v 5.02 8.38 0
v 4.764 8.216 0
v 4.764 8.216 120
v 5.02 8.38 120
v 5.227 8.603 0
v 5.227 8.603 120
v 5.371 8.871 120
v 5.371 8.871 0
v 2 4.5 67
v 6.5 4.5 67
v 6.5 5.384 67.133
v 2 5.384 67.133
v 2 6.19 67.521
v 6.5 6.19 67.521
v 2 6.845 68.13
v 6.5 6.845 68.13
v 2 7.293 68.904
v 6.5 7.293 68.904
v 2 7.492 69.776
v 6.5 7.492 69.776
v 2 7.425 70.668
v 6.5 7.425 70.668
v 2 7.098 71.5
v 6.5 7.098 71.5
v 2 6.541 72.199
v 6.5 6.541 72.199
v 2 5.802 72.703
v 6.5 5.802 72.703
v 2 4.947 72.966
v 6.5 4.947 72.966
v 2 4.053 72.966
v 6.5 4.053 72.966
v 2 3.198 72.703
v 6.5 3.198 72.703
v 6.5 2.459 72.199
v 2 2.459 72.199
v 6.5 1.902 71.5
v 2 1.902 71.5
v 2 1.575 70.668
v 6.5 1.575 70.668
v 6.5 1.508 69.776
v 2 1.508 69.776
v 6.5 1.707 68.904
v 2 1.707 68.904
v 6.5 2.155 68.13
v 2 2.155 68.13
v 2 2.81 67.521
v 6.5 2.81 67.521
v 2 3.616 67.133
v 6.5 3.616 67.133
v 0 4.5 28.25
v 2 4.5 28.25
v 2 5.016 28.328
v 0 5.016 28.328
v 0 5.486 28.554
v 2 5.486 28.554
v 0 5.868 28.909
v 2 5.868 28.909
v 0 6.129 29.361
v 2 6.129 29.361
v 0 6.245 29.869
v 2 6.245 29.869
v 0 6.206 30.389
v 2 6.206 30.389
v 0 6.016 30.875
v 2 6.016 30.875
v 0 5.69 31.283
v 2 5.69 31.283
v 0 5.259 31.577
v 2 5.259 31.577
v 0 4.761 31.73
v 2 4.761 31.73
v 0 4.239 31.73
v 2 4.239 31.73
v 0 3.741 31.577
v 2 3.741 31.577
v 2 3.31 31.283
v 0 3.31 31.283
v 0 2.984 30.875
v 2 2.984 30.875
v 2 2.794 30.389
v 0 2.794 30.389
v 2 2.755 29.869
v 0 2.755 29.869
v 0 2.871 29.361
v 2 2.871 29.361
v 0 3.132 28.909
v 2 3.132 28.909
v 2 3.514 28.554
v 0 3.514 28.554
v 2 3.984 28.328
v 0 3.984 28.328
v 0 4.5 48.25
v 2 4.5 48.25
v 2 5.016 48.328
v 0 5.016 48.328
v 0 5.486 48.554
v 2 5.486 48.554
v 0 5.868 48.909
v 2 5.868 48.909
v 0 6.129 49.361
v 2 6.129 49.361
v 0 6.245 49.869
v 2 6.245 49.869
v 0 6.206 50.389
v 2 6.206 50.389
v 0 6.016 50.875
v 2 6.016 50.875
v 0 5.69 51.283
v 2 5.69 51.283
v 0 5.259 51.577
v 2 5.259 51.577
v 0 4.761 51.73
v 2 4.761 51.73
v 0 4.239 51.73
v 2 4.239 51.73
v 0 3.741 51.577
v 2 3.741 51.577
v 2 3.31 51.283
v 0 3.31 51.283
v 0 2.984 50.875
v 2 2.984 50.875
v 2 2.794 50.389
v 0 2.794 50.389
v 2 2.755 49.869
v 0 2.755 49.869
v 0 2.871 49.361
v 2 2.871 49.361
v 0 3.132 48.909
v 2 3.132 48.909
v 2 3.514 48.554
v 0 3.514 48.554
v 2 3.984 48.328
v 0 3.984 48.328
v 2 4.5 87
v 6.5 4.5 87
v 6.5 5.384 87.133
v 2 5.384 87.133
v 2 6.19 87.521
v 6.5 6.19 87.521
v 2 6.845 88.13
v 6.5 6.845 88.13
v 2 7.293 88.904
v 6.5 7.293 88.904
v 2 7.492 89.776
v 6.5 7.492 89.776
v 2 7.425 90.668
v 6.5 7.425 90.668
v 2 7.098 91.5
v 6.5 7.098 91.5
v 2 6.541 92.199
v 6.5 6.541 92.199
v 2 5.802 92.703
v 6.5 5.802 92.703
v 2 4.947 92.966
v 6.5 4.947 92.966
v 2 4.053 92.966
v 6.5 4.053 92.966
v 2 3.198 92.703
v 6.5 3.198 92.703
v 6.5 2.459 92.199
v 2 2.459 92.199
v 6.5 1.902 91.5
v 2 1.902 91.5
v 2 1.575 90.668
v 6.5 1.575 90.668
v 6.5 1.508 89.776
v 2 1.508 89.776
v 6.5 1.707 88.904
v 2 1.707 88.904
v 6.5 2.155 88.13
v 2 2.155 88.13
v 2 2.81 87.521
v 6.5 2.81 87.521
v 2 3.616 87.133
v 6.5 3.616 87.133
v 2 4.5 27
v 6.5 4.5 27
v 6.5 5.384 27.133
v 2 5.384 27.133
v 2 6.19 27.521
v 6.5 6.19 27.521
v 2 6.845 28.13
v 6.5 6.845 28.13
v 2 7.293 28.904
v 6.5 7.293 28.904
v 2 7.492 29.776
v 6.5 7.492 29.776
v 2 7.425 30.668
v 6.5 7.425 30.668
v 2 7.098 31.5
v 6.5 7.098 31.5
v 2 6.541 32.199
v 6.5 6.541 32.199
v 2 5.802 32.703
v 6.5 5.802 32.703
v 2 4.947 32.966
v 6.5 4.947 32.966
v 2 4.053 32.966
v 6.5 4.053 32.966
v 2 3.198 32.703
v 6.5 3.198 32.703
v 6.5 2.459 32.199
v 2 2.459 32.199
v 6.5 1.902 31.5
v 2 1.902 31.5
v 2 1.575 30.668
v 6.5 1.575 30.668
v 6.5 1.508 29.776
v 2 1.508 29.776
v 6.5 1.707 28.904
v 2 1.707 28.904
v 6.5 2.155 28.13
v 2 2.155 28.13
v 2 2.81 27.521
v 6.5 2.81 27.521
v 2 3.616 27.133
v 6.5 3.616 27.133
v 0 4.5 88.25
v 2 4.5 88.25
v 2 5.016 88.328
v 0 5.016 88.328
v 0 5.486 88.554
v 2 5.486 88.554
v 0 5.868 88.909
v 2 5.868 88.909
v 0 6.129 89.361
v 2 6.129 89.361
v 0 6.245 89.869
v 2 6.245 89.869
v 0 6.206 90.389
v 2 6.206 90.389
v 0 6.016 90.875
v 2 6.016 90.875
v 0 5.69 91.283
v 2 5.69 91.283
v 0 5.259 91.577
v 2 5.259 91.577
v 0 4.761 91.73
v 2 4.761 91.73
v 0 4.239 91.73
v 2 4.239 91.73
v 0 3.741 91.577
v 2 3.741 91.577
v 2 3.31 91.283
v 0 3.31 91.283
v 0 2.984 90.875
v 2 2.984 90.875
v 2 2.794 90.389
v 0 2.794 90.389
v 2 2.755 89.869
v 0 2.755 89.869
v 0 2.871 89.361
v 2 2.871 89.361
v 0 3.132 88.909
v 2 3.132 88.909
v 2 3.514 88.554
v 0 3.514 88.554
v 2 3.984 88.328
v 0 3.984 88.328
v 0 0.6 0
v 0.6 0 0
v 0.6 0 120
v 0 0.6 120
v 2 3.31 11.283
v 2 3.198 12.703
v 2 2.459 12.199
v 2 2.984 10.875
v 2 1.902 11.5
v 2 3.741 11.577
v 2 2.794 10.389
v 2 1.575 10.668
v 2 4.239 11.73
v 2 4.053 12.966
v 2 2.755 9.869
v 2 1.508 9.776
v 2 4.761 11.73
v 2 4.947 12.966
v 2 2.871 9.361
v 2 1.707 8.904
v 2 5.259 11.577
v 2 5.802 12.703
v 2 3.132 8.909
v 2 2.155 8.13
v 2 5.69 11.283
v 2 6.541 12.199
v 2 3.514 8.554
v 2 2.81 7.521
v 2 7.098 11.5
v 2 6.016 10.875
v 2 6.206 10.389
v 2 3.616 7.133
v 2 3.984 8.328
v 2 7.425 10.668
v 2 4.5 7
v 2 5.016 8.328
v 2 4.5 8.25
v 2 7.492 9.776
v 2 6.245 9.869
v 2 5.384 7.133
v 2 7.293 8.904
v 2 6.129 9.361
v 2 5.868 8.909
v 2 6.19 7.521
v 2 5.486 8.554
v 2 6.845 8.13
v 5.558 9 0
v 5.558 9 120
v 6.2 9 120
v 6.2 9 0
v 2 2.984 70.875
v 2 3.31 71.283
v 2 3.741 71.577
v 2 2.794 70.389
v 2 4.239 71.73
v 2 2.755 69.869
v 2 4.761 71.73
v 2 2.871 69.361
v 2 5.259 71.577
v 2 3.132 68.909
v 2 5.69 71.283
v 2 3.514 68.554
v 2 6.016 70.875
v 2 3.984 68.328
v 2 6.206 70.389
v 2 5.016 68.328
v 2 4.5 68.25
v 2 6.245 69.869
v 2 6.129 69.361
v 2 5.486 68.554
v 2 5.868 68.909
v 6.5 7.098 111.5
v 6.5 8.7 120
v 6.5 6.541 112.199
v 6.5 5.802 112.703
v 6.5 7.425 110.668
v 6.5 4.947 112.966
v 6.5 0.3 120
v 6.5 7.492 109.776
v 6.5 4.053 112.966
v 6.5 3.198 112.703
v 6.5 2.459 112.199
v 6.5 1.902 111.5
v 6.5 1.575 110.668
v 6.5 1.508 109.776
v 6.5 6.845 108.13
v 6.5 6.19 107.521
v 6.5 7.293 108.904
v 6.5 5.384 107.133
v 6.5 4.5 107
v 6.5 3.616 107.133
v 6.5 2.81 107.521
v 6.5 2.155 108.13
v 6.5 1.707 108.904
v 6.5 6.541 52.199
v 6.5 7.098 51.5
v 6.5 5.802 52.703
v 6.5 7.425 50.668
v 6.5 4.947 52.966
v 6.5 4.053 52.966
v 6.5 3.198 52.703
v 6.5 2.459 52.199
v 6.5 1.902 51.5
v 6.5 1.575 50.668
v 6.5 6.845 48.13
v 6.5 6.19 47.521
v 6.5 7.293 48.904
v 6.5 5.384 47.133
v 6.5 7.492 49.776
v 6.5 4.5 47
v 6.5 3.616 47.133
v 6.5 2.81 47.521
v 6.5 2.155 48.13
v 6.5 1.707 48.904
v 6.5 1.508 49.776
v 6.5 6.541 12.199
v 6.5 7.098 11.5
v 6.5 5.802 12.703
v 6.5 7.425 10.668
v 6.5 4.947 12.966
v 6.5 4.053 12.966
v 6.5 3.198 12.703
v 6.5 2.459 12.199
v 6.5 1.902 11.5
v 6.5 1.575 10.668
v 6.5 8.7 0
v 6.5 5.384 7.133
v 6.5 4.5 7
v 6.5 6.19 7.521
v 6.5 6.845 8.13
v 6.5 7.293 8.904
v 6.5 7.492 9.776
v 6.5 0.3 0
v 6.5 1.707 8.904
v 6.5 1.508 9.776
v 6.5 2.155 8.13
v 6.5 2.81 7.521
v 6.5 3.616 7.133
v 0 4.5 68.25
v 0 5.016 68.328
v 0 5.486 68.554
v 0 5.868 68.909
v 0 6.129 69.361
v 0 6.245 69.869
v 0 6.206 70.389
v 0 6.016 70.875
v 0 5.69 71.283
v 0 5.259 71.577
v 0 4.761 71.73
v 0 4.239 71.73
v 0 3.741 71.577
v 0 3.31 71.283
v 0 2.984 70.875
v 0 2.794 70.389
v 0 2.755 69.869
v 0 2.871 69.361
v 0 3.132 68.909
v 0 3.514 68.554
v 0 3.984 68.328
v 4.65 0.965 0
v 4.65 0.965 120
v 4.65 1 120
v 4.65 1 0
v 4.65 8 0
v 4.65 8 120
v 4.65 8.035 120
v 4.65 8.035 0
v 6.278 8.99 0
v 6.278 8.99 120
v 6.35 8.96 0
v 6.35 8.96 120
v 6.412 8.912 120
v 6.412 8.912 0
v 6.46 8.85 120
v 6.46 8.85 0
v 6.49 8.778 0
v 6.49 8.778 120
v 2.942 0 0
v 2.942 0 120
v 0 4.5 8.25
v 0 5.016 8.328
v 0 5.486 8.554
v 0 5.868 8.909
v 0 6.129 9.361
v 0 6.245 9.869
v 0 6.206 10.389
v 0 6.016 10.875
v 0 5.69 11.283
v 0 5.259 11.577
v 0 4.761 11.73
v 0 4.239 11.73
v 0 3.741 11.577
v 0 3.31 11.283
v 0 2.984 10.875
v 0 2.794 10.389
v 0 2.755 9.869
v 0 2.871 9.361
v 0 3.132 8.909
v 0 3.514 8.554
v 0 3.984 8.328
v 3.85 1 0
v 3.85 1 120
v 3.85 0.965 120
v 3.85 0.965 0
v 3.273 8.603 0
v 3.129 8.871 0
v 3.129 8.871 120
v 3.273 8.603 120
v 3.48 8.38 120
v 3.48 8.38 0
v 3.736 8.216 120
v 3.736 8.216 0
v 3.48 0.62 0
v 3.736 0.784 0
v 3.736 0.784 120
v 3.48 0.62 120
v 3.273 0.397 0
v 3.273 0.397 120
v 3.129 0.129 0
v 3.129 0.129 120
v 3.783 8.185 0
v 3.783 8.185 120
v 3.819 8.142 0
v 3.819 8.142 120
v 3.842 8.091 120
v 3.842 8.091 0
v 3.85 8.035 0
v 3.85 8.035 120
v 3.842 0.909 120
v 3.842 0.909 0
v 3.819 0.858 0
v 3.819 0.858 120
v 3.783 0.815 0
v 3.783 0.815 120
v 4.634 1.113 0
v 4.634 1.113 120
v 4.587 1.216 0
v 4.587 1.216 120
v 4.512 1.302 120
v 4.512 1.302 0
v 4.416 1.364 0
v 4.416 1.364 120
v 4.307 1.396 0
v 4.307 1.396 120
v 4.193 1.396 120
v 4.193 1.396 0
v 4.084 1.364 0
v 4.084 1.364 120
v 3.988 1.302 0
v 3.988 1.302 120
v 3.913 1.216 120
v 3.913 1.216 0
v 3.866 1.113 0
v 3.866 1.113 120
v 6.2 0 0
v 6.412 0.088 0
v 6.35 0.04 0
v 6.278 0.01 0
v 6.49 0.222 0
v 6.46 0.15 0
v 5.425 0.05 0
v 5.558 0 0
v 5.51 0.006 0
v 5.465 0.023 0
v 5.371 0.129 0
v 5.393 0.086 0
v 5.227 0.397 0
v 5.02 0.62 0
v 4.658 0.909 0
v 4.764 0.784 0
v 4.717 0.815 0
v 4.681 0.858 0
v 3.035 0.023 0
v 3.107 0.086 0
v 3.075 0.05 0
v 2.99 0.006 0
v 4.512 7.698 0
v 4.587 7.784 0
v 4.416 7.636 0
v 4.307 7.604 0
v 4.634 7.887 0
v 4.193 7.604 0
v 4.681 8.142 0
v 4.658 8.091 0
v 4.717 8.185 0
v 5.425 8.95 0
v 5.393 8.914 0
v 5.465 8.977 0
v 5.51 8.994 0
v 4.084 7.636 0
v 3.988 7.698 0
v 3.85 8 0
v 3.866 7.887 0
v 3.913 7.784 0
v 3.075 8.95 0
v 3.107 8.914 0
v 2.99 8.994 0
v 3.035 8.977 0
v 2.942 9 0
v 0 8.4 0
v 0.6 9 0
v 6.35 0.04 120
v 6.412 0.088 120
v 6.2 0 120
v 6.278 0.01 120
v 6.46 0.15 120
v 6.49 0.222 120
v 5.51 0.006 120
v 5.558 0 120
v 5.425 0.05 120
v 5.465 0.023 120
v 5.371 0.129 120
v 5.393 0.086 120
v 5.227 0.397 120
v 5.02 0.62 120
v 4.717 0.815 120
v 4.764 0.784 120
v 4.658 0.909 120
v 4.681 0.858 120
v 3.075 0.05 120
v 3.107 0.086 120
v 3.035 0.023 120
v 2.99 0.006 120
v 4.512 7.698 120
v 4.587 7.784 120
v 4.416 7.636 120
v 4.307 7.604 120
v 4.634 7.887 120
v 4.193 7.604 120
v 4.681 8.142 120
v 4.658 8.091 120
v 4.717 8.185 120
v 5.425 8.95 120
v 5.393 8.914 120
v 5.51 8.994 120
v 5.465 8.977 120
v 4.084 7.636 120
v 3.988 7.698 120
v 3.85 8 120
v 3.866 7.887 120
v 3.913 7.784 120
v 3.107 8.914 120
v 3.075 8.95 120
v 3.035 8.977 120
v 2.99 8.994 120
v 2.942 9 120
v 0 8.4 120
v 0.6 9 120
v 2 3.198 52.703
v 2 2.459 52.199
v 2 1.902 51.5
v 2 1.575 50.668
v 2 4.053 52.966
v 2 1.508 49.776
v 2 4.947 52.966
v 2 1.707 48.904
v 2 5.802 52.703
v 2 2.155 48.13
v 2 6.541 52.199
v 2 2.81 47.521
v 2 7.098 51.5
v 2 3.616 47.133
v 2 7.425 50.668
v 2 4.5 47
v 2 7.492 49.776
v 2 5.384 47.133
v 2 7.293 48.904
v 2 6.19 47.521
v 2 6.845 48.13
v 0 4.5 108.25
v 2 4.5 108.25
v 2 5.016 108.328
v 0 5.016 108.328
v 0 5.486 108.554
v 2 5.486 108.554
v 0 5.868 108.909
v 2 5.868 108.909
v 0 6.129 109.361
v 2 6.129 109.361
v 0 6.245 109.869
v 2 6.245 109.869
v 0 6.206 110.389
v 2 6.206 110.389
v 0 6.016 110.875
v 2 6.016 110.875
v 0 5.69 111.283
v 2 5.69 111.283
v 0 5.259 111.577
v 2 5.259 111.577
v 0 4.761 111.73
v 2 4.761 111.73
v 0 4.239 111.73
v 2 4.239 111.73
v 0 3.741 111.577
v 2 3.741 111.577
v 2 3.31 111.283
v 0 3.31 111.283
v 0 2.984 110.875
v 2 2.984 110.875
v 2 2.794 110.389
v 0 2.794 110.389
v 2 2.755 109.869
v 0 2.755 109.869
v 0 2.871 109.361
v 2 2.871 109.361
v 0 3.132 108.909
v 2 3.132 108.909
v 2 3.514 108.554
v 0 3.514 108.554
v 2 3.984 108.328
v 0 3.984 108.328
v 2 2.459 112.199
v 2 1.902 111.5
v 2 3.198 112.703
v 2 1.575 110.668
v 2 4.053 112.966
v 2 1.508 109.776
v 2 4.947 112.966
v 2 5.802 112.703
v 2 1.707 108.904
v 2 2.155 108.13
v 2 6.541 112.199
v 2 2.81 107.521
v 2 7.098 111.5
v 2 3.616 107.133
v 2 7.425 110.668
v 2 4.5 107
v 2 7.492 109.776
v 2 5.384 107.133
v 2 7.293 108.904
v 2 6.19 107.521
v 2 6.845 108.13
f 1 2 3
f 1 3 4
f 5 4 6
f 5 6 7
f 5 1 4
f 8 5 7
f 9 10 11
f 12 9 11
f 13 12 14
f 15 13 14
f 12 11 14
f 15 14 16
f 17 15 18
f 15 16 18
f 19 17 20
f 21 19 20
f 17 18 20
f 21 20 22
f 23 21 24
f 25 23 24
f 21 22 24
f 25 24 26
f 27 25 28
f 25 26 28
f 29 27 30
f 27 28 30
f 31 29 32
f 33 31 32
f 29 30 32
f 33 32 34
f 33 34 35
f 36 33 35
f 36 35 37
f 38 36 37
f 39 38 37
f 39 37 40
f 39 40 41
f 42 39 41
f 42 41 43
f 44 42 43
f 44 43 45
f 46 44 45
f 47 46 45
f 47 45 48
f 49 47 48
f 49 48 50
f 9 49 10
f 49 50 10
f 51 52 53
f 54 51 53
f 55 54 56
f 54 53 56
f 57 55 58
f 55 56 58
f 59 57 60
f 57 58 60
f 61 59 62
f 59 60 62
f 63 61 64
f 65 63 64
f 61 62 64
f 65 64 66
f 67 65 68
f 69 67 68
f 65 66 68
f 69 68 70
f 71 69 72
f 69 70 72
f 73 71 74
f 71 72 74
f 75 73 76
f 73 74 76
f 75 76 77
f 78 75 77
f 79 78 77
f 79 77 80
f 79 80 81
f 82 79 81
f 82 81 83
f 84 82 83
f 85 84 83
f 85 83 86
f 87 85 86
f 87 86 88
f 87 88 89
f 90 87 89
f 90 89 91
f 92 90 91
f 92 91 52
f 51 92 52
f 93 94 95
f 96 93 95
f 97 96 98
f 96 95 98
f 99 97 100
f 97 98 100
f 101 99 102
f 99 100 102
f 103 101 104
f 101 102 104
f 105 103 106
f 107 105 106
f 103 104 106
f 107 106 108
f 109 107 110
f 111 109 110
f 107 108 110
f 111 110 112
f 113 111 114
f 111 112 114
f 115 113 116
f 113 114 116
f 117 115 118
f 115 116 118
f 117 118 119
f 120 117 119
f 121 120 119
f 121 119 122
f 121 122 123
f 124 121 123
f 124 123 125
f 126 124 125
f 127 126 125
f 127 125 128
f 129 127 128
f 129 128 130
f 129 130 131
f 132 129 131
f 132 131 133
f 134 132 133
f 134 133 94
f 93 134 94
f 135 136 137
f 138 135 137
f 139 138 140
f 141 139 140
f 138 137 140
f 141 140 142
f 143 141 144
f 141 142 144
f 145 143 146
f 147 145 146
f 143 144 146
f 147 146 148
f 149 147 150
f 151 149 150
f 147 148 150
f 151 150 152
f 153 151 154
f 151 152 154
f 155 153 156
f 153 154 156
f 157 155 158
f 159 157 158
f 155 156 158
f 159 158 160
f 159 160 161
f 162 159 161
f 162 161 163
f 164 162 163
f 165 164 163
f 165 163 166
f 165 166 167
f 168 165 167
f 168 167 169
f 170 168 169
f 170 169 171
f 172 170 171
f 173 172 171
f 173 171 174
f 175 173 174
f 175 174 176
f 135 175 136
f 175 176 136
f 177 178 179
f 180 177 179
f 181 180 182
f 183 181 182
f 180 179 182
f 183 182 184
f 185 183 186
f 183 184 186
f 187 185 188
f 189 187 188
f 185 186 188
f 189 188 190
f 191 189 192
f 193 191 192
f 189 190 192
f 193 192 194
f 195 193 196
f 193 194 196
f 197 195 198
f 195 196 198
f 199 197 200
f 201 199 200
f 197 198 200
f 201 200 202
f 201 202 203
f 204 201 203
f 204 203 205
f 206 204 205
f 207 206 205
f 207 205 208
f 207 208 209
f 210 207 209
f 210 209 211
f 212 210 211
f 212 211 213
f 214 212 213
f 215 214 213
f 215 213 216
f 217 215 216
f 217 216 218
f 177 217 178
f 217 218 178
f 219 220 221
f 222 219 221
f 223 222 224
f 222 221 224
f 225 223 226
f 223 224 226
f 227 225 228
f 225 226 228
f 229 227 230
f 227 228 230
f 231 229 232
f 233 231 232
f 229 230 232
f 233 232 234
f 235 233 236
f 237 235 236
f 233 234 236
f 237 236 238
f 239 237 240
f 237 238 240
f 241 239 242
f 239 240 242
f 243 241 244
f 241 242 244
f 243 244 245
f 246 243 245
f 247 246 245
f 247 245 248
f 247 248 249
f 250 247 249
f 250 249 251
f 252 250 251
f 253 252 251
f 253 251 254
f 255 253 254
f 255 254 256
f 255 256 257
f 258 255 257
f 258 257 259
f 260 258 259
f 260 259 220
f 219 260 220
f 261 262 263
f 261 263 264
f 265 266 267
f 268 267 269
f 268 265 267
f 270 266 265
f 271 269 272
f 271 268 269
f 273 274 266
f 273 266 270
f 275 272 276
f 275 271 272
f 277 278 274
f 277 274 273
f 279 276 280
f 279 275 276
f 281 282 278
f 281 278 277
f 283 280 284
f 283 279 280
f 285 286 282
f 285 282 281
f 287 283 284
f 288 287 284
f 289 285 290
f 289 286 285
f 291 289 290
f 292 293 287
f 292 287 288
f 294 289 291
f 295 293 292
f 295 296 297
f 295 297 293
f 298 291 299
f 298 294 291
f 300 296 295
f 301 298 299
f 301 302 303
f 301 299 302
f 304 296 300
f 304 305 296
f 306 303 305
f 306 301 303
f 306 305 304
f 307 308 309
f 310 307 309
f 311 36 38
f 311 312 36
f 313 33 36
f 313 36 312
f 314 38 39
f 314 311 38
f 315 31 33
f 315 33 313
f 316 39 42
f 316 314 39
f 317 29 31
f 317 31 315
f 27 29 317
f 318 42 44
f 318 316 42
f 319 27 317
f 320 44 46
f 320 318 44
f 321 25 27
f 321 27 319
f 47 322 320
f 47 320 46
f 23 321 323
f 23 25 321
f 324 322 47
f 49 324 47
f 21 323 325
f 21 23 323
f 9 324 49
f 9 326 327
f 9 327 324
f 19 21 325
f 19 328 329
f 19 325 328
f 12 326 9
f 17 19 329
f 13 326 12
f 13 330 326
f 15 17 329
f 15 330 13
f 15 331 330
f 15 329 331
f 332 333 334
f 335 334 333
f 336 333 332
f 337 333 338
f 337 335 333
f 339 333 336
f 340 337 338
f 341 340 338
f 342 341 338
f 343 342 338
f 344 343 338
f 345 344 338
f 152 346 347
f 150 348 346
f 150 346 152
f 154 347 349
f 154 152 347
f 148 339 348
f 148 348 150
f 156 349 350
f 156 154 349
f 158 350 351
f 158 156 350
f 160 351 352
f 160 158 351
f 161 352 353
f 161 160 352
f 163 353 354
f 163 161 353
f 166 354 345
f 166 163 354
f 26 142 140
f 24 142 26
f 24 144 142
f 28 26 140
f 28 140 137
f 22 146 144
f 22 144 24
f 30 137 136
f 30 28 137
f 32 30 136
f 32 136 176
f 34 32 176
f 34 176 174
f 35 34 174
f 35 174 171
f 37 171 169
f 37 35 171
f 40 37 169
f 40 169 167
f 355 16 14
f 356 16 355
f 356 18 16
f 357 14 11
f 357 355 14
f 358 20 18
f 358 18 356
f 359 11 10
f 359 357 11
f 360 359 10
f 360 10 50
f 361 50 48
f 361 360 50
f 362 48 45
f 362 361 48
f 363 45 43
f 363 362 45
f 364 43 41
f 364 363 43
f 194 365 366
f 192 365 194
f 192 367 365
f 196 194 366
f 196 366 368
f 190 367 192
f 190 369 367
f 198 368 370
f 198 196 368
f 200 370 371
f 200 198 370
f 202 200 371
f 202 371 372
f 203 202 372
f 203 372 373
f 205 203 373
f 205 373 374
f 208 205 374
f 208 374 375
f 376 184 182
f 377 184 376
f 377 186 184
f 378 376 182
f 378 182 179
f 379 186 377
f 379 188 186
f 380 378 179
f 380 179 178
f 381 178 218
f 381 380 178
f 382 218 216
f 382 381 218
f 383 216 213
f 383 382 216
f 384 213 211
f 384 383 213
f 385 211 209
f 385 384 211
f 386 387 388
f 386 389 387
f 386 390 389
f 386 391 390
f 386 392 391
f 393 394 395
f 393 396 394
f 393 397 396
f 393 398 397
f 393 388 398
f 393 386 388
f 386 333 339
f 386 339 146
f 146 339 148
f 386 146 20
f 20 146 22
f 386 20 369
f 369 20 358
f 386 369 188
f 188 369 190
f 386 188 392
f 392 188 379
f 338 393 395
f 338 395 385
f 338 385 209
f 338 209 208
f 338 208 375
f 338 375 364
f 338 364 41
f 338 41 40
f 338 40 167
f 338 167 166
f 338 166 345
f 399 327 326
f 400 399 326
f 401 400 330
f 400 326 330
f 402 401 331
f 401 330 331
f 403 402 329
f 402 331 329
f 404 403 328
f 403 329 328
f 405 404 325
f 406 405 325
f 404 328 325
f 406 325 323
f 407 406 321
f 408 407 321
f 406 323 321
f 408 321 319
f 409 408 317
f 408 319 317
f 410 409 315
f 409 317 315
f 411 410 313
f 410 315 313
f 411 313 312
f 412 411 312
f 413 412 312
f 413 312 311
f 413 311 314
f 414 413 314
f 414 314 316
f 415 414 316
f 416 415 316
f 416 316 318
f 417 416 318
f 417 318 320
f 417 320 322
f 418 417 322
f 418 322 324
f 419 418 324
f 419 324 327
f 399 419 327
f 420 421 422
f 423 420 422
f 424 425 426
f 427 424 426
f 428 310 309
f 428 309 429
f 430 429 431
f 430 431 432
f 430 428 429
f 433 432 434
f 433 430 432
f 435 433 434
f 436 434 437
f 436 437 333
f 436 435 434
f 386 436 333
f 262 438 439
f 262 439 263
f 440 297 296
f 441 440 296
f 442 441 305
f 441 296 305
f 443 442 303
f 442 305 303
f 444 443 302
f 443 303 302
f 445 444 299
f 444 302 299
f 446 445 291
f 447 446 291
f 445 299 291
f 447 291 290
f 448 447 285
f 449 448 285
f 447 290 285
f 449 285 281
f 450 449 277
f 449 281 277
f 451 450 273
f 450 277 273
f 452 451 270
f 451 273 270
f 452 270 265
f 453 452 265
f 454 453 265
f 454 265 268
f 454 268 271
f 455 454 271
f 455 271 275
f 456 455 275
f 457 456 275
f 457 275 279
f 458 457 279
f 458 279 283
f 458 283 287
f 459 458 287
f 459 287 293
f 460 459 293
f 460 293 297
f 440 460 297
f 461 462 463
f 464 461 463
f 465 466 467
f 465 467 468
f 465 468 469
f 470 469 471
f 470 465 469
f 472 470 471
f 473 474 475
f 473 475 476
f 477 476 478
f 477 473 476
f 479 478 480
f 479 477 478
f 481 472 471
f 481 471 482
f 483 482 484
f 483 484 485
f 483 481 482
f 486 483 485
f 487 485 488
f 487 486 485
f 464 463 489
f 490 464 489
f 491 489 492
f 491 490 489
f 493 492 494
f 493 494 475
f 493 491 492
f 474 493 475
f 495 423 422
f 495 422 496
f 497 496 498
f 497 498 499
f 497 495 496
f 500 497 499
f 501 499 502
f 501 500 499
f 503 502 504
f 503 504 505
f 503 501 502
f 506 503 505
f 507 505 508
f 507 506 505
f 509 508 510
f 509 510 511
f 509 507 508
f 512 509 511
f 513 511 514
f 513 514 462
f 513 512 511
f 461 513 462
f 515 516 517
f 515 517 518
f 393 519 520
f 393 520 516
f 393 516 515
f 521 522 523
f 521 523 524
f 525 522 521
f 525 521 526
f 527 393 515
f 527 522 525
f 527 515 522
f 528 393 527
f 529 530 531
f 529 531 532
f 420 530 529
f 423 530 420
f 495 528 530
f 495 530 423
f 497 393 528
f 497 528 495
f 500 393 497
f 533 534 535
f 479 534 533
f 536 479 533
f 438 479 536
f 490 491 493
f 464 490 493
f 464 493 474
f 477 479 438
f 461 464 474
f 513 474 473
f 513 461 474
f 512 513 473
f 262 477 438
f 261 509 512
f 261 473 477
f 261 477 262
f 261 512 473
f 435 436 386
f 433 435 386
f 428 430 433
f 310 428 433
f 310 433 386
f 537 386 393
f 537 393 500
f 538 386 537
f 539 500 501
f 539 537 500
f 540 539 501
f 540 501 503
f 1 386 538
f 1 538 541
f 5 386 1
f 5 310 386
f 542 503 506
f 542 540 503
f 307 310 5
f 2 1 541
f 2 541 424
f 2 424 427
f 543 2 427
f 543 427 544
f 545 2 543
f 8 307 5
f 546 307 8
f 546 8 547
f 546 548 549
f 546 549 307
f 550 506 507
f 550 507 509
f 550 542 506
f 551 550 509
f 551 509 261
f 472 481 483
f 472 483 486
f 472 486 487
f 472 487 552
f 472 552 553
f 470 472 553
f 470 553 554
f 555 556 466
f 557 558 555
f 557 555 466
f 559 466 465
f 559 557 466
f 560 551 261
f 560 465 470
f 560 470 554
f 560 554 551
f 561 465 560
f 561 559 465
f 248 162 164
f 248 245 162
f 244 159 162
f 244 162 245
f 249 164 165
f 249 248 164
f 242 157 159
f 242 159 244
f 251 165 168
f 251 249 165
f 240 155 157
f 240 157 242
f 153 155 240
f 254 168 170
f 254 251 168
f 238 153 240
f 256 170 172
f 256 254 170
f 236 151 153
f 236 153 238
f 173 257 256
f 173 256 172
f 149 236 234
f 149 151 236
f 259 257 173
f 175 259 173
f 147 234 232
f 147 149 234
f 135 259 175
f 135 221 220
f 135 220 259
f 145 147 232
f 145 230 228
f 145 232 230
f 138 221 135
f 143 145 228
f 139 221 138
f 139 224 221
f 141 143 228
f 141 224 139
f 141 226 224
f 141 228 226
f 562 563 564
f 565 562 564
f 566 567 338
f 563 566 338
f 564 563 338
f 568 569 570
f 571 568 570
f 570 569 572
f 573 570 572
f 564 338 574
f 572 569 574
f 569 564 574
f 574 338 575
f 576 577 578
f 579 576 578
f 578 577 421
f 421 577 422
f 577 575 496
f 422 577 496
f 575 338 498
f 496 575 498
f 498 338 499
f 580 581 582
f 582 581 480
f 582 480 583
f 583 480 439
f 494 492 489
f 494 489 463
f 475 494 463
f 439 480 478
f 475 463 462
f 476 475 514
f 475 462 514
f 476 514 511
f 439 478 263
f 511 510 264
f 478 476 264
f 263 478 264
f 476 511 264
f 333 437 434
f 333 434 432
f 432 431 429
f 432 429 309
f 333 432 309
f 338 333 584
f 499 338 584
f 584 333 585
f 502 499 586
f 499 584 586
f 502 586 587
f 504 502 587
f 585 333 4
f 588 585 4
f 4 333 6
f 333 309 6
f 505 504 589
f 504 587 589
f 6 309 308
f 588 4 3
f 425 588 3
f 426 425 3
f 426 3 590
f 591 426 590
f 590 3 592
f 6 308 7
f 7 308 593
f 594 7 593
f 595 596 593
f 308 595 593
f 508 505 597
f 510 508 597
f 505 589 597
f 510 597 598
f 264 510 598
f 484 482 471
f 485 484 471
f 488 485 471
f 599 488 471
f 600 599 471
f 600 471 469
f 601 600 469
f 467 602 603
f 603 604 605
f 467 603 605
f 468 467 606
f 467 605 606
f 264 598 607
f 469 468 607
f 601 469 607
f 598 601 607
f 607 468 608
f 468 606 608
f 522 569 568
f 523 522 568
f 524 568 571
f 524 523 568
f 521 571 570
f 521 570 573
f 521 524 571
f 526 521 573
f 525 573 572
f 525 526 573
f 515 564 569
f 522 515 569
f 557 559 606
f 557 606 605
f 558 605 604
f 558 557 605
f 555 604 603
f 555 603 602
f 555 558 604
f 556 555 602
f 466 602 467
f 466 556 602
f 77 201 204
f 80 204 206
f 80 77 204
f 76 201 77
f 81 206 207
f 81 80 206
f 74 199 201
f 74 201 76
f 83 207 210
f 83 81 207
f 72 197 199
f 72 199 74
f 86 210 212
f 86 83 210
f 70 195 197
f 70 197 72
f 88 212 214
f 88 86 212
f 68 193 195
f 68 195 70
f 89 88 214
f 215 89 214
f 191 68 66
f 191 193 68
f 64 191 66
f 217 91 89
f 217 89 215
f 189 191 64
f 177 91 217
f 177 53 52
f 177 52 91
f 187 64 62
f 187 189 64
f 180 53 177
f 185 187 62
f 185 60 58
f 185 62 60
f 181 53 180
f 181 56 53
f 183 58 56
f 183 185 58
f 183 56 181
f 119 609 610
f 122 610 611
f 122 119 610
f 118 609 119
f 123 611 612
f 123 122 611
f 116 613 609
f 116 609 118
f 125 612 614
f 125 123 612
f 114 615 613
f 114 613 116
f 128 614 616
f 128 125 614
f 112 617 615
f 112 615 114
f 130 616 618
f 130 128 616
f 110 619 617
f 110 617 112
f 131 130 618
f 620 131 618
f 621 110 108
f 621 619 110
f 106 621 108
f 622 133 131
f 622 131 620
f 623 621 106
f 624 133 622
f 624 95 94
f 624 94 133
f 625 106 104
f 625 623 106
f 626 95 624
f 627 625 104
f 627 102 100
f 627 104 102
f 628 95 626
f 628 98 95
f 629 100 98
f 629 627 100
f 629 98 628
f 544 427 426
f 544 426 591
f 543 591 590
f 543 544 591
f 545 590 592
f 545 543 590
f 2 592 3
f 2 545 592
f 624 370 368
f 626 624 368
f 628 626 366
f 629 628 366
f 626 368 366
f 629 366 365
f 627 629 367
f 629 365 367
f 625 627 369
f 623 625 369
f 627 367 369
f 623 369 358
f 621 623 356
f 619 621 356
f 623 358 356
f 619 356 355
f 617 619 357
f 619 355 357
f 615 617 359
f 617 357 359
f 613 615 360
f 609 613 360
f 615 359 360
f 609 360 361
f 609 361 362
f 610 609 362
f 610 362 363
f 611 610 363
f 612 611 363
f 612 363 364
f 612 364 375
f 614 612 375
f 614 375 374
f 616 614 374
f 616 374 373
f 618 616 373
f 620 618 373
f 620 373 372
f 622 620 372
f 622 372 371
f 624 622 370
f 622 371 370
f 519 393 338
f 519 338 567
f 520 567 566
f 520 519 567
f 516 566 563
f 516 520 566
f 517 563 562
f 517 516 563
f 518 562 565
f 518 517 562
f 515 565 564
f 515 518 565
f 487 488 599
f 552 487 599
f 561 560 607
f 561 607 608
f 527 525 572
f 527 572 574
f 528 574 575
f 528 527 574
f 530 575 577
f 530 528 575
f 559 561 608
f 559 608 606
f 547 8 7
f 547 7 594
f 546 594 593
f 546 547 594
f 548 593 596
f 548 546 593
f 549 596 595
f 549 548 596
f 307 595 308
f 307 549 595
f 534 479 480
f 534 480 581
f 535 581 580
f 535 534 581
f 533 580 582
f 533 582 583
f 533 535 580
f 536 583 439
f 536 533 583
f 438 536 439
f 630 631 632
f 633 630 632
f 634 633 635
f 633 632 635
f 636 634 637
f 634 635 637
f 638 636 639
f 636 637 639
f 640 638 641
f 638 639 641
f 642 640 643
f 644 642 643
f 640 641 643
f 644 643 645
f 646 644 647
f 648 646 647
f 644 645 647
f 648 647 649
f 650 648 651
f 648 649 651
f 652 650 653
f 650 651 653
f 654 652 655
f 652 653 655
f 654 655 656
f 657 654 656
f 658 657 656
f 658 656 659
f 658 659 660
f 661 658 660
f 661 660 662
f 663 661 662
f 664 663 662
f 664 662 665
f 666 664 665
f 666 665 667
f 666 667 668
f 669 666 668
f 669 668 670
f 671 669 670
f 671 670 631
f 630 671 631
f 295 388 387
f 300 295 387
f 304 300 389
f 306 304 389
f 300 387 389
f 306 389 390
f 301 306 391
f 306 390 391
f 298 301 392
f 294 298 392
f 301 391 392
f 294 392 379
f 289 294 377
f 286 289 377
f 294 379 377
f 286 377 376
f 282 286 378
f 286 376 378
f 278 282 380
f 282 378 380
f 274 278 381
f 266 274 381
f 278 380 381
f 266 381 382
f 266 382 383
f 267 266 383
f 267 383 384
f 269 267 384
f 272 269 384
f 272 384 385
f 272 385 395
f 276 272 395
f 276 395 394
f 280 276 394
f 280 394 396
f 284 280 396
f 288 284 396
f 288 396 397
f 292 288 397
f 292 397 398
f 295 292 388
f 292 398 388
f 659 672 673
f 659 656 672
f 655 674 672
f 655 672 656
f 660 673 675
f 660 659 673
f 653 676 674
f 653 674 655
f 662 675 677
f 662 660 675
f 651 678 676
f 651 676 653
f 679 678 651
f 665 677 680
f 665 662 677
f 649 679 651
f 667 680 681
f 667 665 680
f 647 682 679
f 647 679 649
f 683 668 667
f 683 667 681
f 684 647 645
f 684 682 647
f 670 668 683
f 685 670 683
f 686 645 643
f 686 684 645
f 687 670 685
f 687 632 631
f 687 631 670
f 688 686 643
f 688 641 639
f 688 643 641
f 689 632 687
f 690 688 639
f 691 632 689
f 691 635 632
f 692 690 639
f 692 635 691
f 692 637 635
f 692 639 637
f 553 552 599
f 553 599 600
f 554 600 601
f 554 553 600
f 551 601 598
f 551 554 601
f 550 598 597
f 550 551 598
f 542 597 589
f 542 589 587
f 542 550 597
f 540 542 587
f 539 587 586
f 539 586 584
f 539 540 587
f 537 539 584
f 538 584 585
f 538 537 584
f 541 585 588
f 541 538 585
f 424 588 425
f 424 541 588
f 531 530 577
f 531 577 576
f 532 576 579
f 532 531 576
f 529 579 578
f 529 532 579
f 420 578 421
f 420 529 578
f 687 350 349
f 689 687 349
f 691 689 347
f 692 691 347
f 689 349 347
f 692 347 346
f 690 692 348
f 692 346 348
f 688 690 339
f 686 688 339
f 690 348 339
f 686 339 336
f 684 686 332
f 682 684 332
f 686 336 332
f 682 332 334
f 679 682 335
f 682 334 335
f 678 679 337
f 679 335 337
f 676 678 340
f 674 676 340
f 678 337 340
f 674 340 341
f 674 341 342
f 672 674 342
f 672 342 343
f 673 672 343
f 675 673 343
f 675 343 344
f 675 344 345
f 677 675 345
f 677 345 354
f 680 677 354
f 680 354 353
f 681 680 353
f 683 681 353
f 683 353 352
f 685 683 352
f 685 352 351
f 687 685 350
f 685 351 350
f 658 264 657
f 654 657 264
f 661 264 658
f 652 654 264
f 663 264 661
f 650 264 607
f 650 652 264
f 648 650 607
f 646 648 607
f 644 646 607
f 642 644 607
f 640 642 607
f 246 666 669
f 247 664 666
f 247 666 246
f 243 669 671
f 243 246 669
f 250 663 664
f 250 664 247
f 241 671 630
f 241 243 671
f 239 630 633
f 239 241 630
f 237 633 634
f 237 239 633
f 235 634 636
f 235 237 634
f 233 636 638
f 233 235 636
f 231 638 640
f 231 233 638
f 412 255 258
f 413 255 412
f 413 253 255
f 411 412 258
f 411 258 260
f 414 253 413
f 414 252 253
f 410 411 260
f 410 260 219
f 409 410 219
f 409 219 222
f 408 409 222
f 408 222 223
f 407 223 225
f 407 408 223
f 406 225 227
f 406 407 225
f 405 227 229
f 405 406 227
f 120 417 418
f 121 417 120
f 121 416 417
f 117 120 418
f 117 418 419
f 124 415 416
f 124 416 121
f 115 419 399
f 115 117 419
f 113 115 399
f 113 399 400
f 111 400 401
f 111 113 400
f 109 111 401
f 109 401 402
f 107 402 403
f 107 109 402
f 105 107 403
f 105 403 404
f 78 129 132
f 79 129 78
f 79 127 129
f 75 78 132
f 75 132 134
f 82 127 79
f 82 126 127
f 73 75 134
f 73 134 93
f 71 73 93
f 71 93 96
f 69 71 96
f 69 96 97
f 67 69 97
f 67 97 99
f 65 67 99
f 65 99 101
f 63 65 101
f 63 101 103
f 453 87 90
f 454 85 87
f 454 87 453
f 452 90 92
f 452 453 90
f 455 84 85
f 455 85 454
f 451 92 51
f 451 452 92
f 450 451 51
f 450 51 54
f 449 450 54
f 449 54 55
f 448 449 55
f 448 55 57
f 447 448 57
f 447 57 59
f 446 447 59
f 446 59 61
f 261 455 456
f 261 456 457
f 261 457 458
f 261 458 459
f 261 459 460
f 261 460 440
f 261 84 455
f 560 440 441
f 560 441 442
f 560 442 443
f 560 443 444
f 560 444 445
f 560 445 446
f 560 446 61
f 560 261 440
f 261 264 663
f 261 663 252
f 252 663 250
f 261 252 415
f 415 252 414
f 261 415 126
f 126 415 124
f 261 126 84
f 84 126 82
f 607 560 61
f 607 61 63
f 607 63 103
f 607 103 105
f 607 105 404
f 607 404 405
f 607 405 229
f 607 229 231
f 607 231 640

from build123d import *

# Parameters (mm, degrees)
EXTRUDE_1_DEPTH     = 120
SKETCH_2_R          = 3
CUT_EXTRUDE_1_DEPTH = 4.5
SKETCH_3_R          = 1.75
CUT_EXTRUDE_2_DEPTH = 121.421136019


with BuildPart() as part:
    # 草图1 → 凸台-拉伸1 (new body)
    with BuildSketch(Plane.XY):
        with BuildLine():
            ThreePointArc((6.2, 9), (6.412132034, 8.912132034), (6.5, 8.7))
            Line((6.5, 8.7), (6.5, 0.3))
            ThreePointArc((6.5, 0.3), (6.412132034, 0.087867966), (6.2, 0))
            Line((6.2, 0), (5.557669683, 0))
            ThreePointArc((5.557669683, 0), (5.444280341, 0.035249106), (5.370859728, 0.128571429))
            ThreePointArc((5.370859728, 0.128571429), (5.130846451, 0.514929157), (4.764285714, 0.784209483))
            ThreePointArc((4.764285714, 0.784209483), (4.680969149, 0.858006567), (4.65, 0.964911064))
            Line((4.65, 0.964911064), (4.65, 1))
            ThreePointArc((4.65, 1), (4.25, 1.4), (3.85, 1))
            Line((3.85, 1), (3.85, 0.964911064))
            ThreePointArc((3.85, 0.964911064), (3.819030851, 0.858006567), (3.735714286, 0.784209483))
            ThreePointArc((3.735714286, 0.784209483), (3.369153549, 0.514929157), (3.129140272, 0.128571429))
            ThreePointArc((3.129140272, 0.128571429), (3.055719659, 0.035249106), (2.942330317, 0))
            Line((2.942330317, 0), (0.6, 0))
            Line((0.6, 0), (0, 0.6))
            Line((0, 0.6), (0, 8.4))
            Line((0, 8.4), (0.6, 9))
            Line((0.6, 9), (2.942330317, 9))
            ThreePointArc((2.942330317, 9), (3.055719659, 8.964750894), (3.129140272, 8.871428571))
            ThreePointArc((3.129140272, 8.871428571), (3.369153549, 8.485070843), (3.735714286, 8.215790517))
            ThreePointArc((3.735714286, 8.215790517), (3.819030851, 8.141993433), (3.85, 8.035088936))
            Line((3.85, 8.035088936), (3.85, 8))
            ThreePointArc((3.85, 8), (4.25, 7.6), (4.65, 8))
            Line((4.65, 8), (4.65, 8.035088936))
            ThreePointArc((4.65, 8.035088936), (4.680969149, 8.141993433), (4.764285714, 8.215790517))
            ThreePointArc((4.764285714, 8.215790517), (5.130846451, 8.485070843), (5.370859728, 8.871428571))
            ThreePointArc((5.370859728, 8.871428571), (5.444280341, 8.964750894), (5.557669683, 9))
            Line((5.557669683, 9), (6.2, 9))
        make_face()
    extrude(amount=EXTRUDE_1_DEPTH)

    # 草图2 → 切除-拉伸1 (cut)
    with BuildSketch(Plane(origin=(6.5, 0, 0), x_dir=(0, 0, -1), z_dir=(1, 0, 0))):
        with Locations((-10, 4.5)):
            Circle(SKETCH_2_R)
        with Locations((-30, 4.5)):
            Circle(SKETCH_2_R)
        with Locations((-50, 4.5)):
            Circle(SKETCH_2_R)
        with Locations((-70, 4.5)):
            Circle(SKETCH_2_R)
        with Locations((-90, 4.5)):
            Circle(SKETCH_2_R)
        with Locations((-110, 4.5)):
            Circle(SKETCH_2_R)
        with Locations((-130, 4.5)):
            Circle(SKETCH_2_R)
        with Locations((-150, 4.5)):
            Circle(SKETCH_2_R)
        with Locations((-170, 4.5)):
            Circle(SKETCH_2_R)
        with Locations((-190, 4.5)):
            Circle(SKETCH_2_R)
        with Locations((-210, 4.5)):
            Circle(SKETCH_2_R)
        with Locations((-230, 4.5)):
            Circle(SKETCH_2_R)
        with Locations((-250, 4.5)):
            Circle(SKETCH_2_R)
        with Locations((-270, 4.5)):
            Circle(SKETCH_2_R)
        with Locations((-290, 4.5)):
            Circle(SKETCH_2_R)
        with Locations((-310, 4.5)):
            Circle(SKETCH_2_R)
        with Locations((-330, 4.5)):
            Circle(SKETCH_2_R)
        with Locations((-350, 4.5)):
            Circle(SKETCH_2_R)
        with Locations((-370, 4.5)):
            Circle(SKETCH_2_R)
        with Locations((-390, 4.5)):
            Circle(SKETCH_2_R)
        with Locations((-410, 4.5)):
            Circle(SKETCH_2_R)
        with Locations((-430, 4.5)):
            Circle(SKETCH_2_R)
        with Locations((-450, 4.5)):
            Circle(SKETCH_2_R)
        with Locations((-470, 4.5)):
            Circle(SKETCH_2_R)
        with Locations((-490, 4.5)):
            Circle(SKETCH_2_R)
    extrude(amount=-CUT_EXTRUDE_1_DEPTH, mode=Mode.SUBTRACT)

    # 草图3 → 切除-拉伸2 (cut, through all)
    with BuildSketch(Plane(origin=(2, 0, 0), x_dir=(0, 0, -1), z_dir=(1, 0, 0))):
        with Locations((-10, 4.5)):
            Circle(SKETCH_3_R)
        with Locations((-30, 4.5)):
            Circle(SKETCH_3_R)
        with Locations((-50, 4.5)):
            Circle(SKETCH_3_R)
        with Locations((-70, 4.5)):
            Circle(SKETCH_3_R)
        with Locations((-90, 4.5)):
            Circle(SKETCH_3_R)
        with Locations((-110, 4.5)):
            Circle(SKETCH_3_R)
        with Locations((-130, 4.5)):
            Circle(SKETCH_3_R)
        with Locations((-150, 4.5)):
            Circle(SKETCH_3_R)
        with Locations((-170, 4.5)):
            Circle(SKETCH_3_R)
        with Locations((-190, 4.5)):
            Circle(SKETCH_3_R)
        with Locations((-210, 4.5)):
            Circle(SKETCH_3_R)
        with Locations((-230, 4.5)):
            Circle(SKETCH_3_R)
        with Locations((-250, 4.5)):
            Circle(SKETCH_3_R)
        with Locations((-270, 4.5)):
            Circle(SKETCH_3_R)
        with Locations((-290, 4.5)):
            Circle(SKETCH_3_R)
        with Locations((-310, 4.5)):
            Circle(SKETCH_3_R)
        with Locations((-330, 4.5)):
            Circle(SKETCH_3_R)
        with Locations((-350, 4.5)):
            Circle(SKETCH_3_R)
        with Locations((-370, 4.5)):
            Circle(SKETCH_3_R)
        with Locations((-390, 4.5)):
            Circle(SKETCH_3_R)
        with Locations((-410, 4.5)):
            Circle(SKETCH_3_R)
        with Locations((-430, 4.5)):
            Circle(SKETCH_3_R)
        with Locations((-450, 4.5)):
            Circle(SKETCH_3_R)
        with Locations((-470, 4.5)):
            Circle(SKETCH_3_R)
        with Locations((-490, 4.5)):
            Circle(SKETCH_3_R)
    extrude(amount=-CUT_EXTRUDE_2_DEPTH, mode=Mode.SUBTRACT)


solid = part.part
